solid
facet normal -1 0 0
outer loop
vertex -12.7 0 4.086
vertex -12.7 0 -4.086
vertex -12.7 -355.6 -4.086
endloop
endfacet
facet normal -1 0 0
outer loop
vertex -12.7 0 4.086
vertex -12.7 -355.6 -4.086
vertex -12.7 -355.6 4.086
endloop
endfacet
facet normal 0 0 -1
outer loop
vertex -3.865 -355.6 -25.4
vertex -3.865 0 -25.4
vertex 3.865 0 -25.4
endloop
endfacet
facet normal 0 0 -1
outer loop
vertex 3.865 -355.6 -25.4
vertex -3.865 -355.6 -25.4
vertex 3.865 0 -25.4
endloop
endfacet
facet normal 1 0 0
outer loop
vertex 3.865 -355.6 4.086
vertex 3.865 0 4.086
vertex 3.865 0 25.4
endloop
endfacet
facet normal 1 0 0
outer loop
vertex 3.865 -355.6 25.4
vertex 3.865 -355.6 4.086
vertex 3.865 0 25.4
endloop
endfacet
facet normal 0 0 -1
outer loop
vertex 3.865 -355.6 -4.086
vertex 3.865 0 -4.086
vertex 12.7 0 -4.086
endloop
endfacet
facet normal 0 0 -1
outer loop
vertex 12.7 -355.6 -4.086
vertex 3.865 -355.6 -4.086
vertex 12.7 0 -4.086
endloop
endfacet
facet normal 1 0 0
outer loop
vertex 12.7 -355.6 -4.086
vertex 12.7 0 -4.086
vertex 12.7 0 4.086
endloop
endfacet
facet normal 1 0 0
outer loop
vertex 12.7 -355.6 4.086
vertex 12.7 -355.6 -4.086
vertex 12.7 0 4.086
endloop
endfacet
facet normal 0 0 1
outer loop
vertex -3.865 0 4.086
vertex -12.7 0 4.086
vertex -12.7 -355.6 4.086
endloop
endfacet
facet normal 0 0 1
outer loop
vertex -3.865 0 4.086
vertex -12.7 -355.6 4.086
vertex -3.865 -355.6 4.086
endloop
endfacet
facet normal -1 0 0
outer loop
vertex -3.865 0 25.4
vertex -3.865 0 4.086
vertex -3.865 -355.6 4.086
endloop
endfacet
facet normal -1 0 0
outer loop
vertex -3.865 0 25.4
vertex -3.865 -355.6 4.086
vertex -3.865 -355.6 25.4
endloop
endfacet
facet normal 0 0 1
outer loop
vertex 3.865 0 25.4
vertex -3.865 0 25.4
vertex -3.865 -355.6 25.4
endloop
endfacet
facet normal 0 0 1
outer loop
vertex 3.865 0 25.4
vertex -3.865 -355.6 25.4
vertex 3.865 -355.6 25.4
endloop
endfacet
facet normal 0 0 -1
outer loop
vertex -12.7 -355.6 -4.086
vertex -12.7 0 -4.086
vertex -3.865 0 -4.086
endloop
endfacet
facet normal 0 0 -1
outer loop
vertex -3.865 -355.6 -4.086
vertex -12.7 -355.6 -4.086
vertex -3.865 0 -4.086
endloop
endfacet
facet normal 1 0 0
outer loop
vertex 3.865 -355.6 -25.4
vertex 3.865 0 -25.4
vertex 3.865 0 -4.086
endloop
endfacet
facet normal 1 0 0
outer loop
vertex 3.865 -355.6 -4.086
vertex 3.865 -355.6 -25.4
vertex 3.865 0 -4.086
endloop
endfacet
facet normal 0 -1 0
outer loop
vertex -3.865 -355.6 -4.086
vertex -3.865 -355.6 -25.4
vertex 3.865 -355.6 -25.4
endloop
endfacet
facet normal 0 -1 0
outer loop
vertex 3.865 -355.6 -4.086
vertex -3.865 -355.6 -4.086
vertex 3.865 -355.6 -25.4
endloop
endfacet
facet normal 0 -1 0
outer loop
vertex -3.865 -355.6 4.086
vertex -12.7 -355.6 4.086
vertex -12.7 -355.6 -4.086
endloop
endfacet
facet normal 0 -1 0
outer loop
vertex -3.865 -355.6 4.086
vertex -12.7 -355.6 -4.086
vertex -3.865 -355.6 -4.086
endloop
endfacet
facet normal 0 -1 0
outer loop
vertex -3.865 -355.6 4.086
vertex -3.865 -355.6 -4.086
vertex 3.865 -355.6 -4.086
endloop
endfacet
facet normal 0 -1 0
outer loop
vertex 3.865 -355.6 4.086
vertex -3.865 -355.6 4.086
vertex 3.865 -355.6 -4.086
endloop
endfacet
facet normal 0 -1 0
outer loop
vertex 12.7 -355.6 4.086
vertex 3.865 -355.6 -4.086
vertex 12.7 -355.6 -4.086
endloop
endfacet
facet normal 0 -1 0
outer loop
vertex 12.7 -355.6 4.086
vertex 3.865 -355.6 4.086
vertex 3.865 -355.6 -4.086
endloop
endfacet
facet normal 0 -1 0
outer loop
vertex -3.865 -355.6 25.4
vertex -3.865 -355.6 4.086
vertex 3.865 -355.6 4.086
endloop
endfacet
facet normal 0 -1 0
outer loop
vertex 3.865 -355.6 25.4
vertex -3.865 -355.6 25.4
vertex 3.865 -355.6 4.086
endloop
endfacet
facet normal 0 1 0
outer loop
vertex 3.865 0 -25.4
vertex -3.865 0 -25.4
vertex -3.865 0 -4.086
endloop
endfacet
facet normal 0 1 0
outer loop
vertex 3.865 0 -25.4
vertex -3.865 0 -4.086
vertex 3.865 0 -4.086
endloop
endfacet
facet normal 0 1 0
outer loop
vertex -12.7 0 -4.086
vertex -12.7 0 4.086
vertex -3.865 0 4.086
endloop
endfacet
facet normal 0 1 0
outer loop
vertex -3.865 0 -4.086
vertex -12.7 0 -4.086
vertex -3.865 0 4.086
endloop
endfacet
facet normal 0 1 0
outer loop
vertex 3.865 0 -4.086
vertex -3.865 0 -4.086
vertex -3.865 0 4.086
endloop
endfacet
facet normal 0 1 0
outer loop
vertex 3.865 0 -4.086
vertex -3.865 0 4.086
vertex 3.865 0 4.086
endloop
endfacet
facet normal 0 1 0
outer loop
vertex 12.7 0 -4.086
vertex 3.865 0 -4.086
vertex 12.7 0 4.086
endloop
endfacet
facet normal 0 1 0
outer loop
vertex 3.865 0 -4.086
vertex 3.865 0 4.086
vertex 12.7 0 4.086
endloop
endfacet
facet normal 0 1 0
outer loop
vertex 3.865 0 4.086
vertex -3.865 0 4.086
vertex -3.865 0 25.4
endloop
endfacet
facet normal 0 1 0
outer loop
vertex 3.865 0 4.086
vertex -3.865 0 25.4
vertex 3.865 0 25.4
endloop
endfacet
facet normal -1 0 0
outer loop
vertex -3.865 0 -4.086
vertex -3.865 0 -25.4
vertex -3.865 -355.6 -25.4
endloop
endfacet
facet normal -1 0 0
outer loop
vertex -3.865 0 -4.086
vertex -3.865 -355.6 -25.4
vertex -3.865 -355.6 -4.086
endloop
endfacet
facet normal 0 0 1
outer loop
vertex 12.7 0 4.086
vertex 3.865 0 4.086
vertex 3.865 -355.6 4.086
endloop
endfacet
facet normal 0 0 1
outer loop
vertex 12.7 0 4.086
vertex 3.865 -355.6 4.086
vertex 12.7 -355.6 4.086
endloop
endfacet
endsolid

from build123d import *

# Parameters (mm, degrees)
F0_W     = 7.7304354078
F0_H     = 21.3139118999
F0_W_2   = 8.8347822961
F0_H_2   = 8.1721762002
F1_DEPTH = 355.6


with BuildPart() as f1:
    # F0 (on Front) → F1 (new body)
    with BuildSketch(Plane.XZ):
        with Locations((0, 14.7430440501)):
            Rectangle(F0_W, F0_H)
        with Locations((-8.282608852, 0)):
            Rectangle(F0_W_2, F0_H_2)
        with Locations((8.282608852, 0)):
            Rectangle(F0_W_2, F0_H_2)
        with Locations((0, -14.7430440501)):
            Rectangle(F0_W, F0_H)
        Rectangle(F0_W, F0_H_2)
    extrude(amount=F1_DEPTH)


solid = f1.part
